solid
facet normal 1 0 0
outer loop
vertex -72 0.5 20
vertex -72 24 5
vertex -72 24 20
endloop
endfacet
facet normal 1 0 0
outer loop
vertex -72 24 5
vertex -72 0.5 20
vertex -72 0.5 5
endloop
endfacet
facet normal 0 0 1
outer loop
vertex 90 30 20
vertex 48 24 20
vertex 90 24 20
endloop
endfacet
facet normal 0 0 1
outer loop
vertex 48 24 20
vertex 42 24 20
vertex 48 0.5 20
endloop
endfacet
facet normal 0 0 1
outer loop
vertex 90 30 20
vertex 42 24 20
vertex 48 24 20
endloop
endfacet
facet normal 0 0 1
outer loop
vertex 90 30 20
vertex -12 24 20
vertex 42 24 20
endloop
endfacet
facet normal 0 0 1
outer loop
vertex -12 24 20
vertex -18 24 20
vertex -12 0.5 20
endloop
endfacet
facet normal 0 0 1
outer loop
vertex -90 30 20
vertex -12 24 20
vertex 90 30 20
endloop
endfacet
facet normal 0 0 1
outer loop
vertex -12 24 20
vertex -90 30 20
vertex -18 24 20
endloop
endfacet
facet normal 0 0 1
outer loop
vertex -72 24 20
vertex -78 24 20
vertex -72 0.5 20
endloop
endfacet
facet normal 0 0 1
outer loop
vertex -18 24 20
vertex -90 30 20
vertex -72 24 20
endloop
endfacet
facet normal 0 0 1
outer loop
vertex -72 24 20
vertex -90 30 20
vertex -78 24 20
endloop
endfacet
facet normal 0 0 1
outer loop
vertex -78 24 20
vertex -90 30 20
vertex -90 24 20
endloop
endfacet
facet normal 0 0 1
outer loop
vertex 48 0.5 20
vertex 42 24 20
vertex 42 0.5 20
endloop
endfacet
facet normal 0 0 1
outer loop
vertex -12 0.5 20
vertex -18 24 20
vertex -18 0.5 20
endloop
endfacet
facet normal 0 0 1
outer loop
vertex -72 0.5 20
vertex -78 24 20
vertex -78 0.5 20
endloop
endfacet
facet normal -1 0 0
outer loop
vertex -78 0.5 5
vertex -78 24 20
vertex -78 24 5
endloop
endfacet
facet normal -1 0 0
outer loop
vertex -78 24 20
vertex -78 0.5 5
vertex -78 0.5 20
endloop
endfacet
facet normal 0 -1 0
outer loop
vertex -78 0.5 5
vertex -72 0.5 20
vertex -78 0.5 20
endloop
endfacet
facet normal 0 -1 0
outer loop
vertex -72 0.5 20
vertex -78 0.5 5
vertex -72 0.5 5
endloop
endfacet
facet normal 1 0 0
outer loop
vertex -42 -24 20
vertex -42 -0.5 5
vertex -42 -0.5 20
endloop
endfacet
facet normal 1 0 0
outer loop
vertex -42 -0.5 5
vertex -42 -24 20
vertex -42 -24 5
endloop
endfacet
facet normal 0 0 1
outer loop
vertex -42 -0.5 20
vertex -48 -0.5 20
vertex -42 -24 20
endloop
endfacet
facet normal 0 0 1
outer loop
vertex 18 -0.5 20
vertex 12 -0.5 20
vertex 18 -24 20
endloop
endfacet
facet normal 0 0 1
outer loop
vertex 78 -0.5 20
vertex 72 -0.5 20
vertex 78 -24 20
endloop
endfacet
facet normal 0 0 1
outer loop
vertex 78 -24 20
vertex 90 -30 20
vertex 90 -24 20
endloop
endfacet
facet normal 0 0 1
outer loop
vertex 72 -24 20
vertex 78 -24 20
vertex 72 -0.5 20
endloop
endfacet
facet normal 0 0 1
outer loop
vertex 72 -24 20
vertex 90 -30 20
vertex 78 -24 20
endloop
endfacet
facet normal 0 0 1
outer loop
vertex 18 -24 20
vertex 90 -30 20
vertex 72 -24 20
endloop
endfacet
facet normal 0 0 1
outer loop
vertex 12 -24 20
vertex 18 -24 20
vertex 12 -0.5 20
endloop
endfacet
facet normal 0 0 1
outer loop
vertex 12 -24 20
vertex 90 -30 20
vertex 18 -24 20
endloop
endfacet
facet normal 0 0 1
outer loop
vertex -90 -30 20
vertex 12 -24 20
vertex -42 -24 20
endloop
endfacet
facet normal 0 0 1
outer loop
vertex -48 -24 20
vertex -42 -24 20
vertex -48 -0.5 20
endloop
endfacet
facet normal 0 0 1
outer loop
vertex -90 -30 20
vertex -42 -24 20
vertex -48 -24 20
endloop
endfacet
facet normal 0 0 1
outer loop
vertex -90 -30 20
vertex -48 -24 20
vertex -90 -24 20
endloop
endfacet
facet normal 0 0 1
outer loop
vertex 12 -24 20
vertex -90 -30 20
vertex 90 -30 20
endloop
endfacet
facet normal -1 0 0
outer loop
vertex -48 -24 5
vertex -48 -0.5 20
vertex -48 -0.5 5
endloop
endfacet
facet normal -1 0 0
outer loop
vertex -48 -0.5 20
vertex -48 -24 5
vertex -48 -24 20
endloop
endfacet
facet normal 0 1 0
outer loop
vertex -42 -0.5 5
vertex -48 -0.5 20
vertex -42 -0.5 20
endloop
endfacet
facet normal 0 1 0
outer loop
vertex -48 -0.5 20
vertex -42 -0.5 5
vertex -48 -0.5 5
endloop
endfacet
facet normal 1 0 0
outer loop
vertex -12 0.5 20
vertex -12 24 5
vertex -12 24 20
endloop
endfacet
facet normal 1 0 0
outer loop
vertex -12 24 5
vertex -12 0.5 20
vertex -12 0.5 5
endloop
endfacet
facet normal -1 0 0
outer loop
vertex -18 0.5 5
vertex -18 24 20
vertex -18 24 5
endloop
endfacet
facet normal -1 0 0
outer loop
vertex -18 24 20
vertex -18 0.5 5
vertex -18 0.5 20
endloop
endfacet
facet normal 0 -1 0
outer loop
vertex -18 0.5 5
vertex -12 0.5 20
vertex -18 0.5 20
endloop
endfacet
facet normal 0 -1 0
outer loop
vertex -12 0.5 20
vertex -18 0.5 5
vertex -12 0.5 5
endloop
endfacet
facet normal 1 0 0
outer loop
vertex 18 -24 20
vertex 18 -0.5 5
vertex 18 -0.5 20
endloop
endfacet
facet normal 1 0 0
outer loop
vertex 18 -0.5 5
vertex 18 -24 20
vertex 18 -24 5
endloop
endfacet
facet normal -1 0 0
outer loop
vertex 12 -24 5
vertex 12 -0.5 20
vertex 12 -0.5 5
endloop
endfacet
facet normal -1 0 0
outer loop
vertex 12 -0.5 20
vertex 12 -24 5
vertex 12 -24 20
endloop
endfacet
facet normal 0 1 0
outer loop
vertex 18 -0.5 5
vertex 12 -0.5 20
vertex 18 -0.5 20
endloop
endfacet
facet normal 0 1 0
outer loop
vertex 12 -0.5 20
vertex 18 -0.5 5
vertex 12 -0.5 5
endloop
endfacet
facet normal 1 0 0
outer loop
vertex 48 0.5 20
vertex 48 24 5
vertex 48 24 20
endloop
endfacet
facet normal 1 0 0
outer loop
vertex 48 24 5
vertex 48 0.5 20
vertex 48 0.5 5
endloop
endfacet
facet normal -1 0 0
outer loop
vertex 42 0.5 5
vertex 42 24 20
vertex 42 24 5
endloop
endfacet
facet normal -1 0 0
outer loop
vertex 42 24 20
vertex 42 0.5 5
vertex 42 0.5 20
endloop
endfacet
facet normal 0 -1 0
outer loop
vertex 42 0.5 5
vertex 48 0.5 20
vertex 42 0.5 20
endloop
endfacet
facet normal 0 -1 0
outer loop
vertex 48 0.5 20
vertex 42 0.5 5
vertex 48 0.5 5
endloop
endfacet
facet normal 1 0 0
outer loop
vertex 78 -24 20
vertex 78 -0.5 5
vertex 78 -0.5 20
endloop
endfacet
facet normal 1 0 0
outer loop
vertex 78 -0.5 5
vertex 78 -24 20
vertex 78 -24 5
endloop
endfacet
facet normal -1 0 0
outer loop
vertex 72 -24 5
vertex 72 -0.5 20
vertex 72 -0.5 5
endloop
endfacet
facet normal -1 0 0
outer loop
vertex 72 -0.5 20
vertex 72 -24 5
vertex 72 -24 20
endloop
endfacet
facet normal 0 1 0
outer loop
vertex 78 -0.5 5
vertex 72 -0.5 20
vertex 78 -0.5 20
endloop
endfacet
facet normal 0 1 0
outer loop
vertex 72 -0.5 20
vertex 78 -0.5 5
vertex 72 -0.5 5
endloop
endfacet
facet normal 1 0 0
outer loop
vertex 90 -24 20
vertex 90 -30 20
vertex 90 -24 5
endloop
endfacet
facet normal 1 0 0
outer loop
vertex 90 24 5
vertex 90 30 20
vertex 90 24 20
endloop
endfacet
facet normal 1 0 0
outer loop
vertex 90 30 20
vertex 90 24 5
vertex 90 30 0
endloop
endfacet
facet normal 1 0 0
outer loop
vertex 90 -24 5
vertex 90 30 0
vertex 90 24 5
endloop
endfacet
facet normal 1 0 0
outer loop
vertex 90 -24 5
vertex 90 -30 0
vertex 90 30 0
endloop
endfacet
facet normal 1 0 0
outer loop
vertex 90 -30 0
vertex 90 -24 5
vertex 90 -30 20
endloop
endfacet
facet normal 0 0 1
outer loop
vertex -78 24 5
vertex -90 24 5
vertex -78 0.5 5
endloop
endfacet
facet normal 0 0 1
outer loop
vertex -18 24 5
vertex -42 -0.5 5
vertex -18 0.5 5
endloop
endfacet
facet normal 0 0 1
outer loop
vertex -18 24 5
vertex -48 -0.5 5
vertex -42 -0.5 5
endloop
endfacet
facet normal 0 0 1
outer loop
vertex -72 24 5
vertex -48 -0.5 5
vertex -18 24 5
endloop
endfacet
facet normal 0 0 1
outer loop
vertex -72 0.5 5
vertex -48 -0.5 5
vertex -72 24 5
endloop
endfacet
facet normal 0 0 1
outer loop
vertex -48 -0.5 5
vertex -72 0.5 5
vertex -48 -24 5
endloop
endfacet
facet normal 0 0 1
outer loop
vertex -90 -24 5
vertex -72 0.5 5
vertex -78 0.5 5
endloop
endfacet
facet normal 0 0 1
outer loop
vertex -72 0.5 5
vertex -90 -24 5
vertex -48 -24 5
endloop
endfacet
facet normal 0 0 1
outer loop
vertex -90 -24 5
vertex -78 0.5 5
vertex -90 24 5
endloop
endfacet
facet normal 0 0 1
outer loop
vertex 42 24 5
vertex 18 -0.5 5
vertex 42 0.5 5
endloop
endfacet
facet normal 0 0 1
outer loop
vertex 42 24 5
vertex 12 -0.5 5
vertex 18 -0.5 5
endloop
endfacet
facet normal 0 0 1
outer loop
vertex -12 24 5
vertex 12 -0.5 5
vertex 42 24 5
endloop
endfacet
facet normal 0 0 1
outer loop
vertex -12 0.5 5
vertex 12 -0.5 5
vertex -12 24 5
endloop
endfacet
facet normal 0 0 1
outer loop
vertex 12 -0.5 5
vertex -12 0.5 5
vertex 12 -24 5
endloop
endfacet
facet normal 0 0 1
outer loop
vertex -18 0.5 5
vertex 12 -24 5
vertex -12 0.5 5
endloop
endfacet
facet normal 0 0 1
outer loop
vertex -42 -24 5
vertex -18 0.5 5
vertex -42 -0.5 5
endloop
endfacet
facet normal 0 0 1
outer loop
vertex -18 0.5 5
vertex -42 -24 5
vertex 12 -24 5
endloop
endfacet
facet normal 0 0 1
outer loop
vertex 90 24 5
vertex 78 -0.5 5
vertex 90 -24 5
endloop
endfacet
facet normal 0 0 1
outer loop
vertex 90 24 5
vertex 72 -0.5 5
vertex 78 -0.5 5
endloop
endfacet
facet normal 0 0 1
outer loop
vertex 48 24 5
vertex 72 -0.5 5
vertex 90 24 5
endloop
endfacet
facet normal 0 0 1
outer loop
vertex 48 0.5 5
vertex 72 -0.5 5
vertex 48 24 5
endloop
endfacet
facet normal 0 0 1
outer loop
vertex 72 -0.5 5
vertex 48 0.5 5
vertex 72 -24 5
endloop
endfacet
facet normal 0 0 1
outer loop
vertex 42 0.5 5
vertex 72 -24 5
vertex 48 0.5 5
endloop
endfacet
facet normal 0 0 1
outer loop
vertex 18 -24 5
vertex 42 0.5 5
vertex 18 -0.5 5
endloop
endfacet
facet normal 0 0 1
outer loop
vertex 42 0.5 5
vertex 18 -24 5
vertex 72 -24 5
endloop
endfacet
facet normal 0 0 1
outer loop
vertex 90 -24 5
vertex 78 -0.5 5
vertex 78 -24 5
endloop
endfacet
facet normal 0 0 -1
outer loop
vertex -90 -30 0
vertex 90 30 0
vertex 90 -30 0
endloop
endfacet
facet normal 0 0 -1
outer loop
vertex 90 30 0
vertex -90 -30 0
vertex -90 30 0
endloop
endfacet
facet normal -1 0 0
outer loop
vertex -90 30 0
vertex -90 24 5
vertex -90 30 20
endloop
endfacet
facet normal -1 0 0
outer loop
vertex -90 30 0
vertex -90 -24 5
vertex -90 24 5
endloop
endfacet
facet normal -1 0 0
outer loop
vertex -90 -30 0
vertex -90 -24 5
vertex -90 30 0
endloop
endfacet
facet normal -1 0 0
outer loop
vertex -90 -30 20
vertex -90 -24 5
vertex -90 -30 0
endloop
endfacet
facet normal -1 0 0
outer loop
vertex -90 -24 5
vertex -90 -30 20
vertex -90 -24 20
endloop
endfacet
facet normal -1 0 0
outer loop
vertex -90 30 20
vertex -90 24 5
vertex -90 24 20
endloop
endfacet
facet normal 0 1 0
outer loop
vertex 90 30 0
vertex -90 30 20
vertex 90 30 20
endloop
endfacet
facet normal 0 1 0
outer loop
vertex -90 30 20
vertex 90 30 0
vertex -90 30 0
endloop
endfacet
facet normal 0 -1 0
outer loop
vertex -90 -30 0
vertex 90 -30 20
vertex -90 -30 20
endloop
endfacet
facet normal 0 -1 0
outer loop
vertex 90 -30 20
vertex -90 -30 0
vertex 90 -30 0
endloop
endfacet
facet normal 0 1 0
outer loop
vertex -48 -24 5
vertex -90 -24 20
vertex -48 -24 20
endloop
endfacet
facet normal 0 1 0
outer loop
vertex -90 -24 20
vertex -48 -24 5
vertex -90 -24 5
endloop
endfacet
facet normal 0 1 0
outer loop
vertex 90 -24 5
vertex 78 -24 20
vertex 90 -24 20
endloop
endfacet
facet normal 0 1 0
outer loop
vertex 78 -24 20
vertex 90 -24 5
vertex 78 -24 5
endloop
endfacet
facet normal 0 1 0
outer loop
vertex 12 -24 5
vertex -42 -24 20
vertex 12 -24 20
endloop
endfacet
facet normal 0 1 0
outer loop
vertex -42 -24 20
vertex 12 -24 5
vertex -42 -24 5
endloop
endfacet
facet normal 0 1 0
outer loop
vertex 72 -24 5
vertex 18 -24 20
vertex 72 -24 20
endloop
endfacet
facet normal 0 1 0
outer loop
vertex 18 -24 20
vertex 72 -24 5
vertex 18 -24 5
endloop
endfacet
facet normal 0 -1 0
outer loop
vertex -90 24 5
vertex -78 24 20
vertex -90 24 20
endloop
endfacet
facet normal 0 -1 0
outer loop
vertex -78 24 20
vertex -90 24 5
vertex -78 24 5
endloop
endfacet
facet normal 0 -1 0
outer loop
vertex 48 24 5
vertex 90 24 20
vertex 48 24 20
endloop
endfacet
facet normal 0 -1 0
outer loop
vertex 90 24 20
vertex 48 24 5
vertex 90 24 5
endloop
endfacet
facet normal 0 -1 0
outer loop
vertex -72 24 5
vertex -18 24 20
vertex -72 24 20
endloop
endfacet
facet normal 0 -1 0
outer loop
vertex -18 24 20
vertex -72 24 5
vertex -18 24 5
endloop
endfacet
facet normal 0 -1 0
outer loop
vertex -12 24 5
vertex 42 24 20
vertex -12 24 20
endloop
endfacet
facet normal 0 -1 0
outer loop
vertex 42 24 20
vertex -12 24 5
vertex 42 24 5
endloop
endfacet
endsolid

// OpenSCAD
$fn = 32;

// ----------------------------------------------------------------------
// Rib frame 180 x 60 x 20
// 6 ribs at 30 mm pitch, staggered
// ----------------------------------------------------------------------

// --- parameters (mm) ---
frame = [180, 60, 5];  // base plate size (x, y, z)
rail_w = 6;            // side rail width
ribs = 6;              // number of ribs
rib_t = 6;             // rib thickness
rib_h = 15;            // rib height above the base plate
pitch = 30;            // pitch between rib centres

// --- derived feature positions (mm) ---
span = (ribs - 1) * pitch;          // = 150   distance between the outer ribs
origin_x = -span / 2;               // = -75   X of the first rib
rib_len = frame[1] / 2 - rail_w + 0.5;  // = 24.5   length of a staggered rib
rib_y = 0.5 + rib_len / 2;          // = 12.75   Y of a staggered rib centre
row_offset = 2 * rib_y;             // = 25.5   distance between the two rows
feature_centers = [
  [origin_x + 0 * pitch, rib_y],
  [origin_x + 1 * pitch, -rib_y],
  [origin_x + 2 * pitch, rib_y],
  [origin_x + 3 * pitch, -rib_y],
  [origin_x + 4 * pitch, rib_y],
  [origin_x + 5 * pitch, -rib_y]
];   // rib centre line, drives the rib loop

// base plate, two side rails, then the ribs read straight off feature_centers
union() {
  translate([-frame[0] / 2, -frame[1] / 2, 0]) cube(frame);
  translate([-frame[0] / 2, -frame[1] / 2, 0]) cube([frame[0], rail_w, frame[2] + rib_h]);
  translate([-frame[0] / 2, frame[1] / 2 - rail_w, 0]) cube([frame[0], rail_w, frame[2] + rib_h]);
  for (centre = feature_centers)
    translate([centre[0] - rib_t / 2, centre[1] - rib_len / 2, frame[2] - 1])
      cube([rib_t, rib_len, rib_h + 1]);
}
